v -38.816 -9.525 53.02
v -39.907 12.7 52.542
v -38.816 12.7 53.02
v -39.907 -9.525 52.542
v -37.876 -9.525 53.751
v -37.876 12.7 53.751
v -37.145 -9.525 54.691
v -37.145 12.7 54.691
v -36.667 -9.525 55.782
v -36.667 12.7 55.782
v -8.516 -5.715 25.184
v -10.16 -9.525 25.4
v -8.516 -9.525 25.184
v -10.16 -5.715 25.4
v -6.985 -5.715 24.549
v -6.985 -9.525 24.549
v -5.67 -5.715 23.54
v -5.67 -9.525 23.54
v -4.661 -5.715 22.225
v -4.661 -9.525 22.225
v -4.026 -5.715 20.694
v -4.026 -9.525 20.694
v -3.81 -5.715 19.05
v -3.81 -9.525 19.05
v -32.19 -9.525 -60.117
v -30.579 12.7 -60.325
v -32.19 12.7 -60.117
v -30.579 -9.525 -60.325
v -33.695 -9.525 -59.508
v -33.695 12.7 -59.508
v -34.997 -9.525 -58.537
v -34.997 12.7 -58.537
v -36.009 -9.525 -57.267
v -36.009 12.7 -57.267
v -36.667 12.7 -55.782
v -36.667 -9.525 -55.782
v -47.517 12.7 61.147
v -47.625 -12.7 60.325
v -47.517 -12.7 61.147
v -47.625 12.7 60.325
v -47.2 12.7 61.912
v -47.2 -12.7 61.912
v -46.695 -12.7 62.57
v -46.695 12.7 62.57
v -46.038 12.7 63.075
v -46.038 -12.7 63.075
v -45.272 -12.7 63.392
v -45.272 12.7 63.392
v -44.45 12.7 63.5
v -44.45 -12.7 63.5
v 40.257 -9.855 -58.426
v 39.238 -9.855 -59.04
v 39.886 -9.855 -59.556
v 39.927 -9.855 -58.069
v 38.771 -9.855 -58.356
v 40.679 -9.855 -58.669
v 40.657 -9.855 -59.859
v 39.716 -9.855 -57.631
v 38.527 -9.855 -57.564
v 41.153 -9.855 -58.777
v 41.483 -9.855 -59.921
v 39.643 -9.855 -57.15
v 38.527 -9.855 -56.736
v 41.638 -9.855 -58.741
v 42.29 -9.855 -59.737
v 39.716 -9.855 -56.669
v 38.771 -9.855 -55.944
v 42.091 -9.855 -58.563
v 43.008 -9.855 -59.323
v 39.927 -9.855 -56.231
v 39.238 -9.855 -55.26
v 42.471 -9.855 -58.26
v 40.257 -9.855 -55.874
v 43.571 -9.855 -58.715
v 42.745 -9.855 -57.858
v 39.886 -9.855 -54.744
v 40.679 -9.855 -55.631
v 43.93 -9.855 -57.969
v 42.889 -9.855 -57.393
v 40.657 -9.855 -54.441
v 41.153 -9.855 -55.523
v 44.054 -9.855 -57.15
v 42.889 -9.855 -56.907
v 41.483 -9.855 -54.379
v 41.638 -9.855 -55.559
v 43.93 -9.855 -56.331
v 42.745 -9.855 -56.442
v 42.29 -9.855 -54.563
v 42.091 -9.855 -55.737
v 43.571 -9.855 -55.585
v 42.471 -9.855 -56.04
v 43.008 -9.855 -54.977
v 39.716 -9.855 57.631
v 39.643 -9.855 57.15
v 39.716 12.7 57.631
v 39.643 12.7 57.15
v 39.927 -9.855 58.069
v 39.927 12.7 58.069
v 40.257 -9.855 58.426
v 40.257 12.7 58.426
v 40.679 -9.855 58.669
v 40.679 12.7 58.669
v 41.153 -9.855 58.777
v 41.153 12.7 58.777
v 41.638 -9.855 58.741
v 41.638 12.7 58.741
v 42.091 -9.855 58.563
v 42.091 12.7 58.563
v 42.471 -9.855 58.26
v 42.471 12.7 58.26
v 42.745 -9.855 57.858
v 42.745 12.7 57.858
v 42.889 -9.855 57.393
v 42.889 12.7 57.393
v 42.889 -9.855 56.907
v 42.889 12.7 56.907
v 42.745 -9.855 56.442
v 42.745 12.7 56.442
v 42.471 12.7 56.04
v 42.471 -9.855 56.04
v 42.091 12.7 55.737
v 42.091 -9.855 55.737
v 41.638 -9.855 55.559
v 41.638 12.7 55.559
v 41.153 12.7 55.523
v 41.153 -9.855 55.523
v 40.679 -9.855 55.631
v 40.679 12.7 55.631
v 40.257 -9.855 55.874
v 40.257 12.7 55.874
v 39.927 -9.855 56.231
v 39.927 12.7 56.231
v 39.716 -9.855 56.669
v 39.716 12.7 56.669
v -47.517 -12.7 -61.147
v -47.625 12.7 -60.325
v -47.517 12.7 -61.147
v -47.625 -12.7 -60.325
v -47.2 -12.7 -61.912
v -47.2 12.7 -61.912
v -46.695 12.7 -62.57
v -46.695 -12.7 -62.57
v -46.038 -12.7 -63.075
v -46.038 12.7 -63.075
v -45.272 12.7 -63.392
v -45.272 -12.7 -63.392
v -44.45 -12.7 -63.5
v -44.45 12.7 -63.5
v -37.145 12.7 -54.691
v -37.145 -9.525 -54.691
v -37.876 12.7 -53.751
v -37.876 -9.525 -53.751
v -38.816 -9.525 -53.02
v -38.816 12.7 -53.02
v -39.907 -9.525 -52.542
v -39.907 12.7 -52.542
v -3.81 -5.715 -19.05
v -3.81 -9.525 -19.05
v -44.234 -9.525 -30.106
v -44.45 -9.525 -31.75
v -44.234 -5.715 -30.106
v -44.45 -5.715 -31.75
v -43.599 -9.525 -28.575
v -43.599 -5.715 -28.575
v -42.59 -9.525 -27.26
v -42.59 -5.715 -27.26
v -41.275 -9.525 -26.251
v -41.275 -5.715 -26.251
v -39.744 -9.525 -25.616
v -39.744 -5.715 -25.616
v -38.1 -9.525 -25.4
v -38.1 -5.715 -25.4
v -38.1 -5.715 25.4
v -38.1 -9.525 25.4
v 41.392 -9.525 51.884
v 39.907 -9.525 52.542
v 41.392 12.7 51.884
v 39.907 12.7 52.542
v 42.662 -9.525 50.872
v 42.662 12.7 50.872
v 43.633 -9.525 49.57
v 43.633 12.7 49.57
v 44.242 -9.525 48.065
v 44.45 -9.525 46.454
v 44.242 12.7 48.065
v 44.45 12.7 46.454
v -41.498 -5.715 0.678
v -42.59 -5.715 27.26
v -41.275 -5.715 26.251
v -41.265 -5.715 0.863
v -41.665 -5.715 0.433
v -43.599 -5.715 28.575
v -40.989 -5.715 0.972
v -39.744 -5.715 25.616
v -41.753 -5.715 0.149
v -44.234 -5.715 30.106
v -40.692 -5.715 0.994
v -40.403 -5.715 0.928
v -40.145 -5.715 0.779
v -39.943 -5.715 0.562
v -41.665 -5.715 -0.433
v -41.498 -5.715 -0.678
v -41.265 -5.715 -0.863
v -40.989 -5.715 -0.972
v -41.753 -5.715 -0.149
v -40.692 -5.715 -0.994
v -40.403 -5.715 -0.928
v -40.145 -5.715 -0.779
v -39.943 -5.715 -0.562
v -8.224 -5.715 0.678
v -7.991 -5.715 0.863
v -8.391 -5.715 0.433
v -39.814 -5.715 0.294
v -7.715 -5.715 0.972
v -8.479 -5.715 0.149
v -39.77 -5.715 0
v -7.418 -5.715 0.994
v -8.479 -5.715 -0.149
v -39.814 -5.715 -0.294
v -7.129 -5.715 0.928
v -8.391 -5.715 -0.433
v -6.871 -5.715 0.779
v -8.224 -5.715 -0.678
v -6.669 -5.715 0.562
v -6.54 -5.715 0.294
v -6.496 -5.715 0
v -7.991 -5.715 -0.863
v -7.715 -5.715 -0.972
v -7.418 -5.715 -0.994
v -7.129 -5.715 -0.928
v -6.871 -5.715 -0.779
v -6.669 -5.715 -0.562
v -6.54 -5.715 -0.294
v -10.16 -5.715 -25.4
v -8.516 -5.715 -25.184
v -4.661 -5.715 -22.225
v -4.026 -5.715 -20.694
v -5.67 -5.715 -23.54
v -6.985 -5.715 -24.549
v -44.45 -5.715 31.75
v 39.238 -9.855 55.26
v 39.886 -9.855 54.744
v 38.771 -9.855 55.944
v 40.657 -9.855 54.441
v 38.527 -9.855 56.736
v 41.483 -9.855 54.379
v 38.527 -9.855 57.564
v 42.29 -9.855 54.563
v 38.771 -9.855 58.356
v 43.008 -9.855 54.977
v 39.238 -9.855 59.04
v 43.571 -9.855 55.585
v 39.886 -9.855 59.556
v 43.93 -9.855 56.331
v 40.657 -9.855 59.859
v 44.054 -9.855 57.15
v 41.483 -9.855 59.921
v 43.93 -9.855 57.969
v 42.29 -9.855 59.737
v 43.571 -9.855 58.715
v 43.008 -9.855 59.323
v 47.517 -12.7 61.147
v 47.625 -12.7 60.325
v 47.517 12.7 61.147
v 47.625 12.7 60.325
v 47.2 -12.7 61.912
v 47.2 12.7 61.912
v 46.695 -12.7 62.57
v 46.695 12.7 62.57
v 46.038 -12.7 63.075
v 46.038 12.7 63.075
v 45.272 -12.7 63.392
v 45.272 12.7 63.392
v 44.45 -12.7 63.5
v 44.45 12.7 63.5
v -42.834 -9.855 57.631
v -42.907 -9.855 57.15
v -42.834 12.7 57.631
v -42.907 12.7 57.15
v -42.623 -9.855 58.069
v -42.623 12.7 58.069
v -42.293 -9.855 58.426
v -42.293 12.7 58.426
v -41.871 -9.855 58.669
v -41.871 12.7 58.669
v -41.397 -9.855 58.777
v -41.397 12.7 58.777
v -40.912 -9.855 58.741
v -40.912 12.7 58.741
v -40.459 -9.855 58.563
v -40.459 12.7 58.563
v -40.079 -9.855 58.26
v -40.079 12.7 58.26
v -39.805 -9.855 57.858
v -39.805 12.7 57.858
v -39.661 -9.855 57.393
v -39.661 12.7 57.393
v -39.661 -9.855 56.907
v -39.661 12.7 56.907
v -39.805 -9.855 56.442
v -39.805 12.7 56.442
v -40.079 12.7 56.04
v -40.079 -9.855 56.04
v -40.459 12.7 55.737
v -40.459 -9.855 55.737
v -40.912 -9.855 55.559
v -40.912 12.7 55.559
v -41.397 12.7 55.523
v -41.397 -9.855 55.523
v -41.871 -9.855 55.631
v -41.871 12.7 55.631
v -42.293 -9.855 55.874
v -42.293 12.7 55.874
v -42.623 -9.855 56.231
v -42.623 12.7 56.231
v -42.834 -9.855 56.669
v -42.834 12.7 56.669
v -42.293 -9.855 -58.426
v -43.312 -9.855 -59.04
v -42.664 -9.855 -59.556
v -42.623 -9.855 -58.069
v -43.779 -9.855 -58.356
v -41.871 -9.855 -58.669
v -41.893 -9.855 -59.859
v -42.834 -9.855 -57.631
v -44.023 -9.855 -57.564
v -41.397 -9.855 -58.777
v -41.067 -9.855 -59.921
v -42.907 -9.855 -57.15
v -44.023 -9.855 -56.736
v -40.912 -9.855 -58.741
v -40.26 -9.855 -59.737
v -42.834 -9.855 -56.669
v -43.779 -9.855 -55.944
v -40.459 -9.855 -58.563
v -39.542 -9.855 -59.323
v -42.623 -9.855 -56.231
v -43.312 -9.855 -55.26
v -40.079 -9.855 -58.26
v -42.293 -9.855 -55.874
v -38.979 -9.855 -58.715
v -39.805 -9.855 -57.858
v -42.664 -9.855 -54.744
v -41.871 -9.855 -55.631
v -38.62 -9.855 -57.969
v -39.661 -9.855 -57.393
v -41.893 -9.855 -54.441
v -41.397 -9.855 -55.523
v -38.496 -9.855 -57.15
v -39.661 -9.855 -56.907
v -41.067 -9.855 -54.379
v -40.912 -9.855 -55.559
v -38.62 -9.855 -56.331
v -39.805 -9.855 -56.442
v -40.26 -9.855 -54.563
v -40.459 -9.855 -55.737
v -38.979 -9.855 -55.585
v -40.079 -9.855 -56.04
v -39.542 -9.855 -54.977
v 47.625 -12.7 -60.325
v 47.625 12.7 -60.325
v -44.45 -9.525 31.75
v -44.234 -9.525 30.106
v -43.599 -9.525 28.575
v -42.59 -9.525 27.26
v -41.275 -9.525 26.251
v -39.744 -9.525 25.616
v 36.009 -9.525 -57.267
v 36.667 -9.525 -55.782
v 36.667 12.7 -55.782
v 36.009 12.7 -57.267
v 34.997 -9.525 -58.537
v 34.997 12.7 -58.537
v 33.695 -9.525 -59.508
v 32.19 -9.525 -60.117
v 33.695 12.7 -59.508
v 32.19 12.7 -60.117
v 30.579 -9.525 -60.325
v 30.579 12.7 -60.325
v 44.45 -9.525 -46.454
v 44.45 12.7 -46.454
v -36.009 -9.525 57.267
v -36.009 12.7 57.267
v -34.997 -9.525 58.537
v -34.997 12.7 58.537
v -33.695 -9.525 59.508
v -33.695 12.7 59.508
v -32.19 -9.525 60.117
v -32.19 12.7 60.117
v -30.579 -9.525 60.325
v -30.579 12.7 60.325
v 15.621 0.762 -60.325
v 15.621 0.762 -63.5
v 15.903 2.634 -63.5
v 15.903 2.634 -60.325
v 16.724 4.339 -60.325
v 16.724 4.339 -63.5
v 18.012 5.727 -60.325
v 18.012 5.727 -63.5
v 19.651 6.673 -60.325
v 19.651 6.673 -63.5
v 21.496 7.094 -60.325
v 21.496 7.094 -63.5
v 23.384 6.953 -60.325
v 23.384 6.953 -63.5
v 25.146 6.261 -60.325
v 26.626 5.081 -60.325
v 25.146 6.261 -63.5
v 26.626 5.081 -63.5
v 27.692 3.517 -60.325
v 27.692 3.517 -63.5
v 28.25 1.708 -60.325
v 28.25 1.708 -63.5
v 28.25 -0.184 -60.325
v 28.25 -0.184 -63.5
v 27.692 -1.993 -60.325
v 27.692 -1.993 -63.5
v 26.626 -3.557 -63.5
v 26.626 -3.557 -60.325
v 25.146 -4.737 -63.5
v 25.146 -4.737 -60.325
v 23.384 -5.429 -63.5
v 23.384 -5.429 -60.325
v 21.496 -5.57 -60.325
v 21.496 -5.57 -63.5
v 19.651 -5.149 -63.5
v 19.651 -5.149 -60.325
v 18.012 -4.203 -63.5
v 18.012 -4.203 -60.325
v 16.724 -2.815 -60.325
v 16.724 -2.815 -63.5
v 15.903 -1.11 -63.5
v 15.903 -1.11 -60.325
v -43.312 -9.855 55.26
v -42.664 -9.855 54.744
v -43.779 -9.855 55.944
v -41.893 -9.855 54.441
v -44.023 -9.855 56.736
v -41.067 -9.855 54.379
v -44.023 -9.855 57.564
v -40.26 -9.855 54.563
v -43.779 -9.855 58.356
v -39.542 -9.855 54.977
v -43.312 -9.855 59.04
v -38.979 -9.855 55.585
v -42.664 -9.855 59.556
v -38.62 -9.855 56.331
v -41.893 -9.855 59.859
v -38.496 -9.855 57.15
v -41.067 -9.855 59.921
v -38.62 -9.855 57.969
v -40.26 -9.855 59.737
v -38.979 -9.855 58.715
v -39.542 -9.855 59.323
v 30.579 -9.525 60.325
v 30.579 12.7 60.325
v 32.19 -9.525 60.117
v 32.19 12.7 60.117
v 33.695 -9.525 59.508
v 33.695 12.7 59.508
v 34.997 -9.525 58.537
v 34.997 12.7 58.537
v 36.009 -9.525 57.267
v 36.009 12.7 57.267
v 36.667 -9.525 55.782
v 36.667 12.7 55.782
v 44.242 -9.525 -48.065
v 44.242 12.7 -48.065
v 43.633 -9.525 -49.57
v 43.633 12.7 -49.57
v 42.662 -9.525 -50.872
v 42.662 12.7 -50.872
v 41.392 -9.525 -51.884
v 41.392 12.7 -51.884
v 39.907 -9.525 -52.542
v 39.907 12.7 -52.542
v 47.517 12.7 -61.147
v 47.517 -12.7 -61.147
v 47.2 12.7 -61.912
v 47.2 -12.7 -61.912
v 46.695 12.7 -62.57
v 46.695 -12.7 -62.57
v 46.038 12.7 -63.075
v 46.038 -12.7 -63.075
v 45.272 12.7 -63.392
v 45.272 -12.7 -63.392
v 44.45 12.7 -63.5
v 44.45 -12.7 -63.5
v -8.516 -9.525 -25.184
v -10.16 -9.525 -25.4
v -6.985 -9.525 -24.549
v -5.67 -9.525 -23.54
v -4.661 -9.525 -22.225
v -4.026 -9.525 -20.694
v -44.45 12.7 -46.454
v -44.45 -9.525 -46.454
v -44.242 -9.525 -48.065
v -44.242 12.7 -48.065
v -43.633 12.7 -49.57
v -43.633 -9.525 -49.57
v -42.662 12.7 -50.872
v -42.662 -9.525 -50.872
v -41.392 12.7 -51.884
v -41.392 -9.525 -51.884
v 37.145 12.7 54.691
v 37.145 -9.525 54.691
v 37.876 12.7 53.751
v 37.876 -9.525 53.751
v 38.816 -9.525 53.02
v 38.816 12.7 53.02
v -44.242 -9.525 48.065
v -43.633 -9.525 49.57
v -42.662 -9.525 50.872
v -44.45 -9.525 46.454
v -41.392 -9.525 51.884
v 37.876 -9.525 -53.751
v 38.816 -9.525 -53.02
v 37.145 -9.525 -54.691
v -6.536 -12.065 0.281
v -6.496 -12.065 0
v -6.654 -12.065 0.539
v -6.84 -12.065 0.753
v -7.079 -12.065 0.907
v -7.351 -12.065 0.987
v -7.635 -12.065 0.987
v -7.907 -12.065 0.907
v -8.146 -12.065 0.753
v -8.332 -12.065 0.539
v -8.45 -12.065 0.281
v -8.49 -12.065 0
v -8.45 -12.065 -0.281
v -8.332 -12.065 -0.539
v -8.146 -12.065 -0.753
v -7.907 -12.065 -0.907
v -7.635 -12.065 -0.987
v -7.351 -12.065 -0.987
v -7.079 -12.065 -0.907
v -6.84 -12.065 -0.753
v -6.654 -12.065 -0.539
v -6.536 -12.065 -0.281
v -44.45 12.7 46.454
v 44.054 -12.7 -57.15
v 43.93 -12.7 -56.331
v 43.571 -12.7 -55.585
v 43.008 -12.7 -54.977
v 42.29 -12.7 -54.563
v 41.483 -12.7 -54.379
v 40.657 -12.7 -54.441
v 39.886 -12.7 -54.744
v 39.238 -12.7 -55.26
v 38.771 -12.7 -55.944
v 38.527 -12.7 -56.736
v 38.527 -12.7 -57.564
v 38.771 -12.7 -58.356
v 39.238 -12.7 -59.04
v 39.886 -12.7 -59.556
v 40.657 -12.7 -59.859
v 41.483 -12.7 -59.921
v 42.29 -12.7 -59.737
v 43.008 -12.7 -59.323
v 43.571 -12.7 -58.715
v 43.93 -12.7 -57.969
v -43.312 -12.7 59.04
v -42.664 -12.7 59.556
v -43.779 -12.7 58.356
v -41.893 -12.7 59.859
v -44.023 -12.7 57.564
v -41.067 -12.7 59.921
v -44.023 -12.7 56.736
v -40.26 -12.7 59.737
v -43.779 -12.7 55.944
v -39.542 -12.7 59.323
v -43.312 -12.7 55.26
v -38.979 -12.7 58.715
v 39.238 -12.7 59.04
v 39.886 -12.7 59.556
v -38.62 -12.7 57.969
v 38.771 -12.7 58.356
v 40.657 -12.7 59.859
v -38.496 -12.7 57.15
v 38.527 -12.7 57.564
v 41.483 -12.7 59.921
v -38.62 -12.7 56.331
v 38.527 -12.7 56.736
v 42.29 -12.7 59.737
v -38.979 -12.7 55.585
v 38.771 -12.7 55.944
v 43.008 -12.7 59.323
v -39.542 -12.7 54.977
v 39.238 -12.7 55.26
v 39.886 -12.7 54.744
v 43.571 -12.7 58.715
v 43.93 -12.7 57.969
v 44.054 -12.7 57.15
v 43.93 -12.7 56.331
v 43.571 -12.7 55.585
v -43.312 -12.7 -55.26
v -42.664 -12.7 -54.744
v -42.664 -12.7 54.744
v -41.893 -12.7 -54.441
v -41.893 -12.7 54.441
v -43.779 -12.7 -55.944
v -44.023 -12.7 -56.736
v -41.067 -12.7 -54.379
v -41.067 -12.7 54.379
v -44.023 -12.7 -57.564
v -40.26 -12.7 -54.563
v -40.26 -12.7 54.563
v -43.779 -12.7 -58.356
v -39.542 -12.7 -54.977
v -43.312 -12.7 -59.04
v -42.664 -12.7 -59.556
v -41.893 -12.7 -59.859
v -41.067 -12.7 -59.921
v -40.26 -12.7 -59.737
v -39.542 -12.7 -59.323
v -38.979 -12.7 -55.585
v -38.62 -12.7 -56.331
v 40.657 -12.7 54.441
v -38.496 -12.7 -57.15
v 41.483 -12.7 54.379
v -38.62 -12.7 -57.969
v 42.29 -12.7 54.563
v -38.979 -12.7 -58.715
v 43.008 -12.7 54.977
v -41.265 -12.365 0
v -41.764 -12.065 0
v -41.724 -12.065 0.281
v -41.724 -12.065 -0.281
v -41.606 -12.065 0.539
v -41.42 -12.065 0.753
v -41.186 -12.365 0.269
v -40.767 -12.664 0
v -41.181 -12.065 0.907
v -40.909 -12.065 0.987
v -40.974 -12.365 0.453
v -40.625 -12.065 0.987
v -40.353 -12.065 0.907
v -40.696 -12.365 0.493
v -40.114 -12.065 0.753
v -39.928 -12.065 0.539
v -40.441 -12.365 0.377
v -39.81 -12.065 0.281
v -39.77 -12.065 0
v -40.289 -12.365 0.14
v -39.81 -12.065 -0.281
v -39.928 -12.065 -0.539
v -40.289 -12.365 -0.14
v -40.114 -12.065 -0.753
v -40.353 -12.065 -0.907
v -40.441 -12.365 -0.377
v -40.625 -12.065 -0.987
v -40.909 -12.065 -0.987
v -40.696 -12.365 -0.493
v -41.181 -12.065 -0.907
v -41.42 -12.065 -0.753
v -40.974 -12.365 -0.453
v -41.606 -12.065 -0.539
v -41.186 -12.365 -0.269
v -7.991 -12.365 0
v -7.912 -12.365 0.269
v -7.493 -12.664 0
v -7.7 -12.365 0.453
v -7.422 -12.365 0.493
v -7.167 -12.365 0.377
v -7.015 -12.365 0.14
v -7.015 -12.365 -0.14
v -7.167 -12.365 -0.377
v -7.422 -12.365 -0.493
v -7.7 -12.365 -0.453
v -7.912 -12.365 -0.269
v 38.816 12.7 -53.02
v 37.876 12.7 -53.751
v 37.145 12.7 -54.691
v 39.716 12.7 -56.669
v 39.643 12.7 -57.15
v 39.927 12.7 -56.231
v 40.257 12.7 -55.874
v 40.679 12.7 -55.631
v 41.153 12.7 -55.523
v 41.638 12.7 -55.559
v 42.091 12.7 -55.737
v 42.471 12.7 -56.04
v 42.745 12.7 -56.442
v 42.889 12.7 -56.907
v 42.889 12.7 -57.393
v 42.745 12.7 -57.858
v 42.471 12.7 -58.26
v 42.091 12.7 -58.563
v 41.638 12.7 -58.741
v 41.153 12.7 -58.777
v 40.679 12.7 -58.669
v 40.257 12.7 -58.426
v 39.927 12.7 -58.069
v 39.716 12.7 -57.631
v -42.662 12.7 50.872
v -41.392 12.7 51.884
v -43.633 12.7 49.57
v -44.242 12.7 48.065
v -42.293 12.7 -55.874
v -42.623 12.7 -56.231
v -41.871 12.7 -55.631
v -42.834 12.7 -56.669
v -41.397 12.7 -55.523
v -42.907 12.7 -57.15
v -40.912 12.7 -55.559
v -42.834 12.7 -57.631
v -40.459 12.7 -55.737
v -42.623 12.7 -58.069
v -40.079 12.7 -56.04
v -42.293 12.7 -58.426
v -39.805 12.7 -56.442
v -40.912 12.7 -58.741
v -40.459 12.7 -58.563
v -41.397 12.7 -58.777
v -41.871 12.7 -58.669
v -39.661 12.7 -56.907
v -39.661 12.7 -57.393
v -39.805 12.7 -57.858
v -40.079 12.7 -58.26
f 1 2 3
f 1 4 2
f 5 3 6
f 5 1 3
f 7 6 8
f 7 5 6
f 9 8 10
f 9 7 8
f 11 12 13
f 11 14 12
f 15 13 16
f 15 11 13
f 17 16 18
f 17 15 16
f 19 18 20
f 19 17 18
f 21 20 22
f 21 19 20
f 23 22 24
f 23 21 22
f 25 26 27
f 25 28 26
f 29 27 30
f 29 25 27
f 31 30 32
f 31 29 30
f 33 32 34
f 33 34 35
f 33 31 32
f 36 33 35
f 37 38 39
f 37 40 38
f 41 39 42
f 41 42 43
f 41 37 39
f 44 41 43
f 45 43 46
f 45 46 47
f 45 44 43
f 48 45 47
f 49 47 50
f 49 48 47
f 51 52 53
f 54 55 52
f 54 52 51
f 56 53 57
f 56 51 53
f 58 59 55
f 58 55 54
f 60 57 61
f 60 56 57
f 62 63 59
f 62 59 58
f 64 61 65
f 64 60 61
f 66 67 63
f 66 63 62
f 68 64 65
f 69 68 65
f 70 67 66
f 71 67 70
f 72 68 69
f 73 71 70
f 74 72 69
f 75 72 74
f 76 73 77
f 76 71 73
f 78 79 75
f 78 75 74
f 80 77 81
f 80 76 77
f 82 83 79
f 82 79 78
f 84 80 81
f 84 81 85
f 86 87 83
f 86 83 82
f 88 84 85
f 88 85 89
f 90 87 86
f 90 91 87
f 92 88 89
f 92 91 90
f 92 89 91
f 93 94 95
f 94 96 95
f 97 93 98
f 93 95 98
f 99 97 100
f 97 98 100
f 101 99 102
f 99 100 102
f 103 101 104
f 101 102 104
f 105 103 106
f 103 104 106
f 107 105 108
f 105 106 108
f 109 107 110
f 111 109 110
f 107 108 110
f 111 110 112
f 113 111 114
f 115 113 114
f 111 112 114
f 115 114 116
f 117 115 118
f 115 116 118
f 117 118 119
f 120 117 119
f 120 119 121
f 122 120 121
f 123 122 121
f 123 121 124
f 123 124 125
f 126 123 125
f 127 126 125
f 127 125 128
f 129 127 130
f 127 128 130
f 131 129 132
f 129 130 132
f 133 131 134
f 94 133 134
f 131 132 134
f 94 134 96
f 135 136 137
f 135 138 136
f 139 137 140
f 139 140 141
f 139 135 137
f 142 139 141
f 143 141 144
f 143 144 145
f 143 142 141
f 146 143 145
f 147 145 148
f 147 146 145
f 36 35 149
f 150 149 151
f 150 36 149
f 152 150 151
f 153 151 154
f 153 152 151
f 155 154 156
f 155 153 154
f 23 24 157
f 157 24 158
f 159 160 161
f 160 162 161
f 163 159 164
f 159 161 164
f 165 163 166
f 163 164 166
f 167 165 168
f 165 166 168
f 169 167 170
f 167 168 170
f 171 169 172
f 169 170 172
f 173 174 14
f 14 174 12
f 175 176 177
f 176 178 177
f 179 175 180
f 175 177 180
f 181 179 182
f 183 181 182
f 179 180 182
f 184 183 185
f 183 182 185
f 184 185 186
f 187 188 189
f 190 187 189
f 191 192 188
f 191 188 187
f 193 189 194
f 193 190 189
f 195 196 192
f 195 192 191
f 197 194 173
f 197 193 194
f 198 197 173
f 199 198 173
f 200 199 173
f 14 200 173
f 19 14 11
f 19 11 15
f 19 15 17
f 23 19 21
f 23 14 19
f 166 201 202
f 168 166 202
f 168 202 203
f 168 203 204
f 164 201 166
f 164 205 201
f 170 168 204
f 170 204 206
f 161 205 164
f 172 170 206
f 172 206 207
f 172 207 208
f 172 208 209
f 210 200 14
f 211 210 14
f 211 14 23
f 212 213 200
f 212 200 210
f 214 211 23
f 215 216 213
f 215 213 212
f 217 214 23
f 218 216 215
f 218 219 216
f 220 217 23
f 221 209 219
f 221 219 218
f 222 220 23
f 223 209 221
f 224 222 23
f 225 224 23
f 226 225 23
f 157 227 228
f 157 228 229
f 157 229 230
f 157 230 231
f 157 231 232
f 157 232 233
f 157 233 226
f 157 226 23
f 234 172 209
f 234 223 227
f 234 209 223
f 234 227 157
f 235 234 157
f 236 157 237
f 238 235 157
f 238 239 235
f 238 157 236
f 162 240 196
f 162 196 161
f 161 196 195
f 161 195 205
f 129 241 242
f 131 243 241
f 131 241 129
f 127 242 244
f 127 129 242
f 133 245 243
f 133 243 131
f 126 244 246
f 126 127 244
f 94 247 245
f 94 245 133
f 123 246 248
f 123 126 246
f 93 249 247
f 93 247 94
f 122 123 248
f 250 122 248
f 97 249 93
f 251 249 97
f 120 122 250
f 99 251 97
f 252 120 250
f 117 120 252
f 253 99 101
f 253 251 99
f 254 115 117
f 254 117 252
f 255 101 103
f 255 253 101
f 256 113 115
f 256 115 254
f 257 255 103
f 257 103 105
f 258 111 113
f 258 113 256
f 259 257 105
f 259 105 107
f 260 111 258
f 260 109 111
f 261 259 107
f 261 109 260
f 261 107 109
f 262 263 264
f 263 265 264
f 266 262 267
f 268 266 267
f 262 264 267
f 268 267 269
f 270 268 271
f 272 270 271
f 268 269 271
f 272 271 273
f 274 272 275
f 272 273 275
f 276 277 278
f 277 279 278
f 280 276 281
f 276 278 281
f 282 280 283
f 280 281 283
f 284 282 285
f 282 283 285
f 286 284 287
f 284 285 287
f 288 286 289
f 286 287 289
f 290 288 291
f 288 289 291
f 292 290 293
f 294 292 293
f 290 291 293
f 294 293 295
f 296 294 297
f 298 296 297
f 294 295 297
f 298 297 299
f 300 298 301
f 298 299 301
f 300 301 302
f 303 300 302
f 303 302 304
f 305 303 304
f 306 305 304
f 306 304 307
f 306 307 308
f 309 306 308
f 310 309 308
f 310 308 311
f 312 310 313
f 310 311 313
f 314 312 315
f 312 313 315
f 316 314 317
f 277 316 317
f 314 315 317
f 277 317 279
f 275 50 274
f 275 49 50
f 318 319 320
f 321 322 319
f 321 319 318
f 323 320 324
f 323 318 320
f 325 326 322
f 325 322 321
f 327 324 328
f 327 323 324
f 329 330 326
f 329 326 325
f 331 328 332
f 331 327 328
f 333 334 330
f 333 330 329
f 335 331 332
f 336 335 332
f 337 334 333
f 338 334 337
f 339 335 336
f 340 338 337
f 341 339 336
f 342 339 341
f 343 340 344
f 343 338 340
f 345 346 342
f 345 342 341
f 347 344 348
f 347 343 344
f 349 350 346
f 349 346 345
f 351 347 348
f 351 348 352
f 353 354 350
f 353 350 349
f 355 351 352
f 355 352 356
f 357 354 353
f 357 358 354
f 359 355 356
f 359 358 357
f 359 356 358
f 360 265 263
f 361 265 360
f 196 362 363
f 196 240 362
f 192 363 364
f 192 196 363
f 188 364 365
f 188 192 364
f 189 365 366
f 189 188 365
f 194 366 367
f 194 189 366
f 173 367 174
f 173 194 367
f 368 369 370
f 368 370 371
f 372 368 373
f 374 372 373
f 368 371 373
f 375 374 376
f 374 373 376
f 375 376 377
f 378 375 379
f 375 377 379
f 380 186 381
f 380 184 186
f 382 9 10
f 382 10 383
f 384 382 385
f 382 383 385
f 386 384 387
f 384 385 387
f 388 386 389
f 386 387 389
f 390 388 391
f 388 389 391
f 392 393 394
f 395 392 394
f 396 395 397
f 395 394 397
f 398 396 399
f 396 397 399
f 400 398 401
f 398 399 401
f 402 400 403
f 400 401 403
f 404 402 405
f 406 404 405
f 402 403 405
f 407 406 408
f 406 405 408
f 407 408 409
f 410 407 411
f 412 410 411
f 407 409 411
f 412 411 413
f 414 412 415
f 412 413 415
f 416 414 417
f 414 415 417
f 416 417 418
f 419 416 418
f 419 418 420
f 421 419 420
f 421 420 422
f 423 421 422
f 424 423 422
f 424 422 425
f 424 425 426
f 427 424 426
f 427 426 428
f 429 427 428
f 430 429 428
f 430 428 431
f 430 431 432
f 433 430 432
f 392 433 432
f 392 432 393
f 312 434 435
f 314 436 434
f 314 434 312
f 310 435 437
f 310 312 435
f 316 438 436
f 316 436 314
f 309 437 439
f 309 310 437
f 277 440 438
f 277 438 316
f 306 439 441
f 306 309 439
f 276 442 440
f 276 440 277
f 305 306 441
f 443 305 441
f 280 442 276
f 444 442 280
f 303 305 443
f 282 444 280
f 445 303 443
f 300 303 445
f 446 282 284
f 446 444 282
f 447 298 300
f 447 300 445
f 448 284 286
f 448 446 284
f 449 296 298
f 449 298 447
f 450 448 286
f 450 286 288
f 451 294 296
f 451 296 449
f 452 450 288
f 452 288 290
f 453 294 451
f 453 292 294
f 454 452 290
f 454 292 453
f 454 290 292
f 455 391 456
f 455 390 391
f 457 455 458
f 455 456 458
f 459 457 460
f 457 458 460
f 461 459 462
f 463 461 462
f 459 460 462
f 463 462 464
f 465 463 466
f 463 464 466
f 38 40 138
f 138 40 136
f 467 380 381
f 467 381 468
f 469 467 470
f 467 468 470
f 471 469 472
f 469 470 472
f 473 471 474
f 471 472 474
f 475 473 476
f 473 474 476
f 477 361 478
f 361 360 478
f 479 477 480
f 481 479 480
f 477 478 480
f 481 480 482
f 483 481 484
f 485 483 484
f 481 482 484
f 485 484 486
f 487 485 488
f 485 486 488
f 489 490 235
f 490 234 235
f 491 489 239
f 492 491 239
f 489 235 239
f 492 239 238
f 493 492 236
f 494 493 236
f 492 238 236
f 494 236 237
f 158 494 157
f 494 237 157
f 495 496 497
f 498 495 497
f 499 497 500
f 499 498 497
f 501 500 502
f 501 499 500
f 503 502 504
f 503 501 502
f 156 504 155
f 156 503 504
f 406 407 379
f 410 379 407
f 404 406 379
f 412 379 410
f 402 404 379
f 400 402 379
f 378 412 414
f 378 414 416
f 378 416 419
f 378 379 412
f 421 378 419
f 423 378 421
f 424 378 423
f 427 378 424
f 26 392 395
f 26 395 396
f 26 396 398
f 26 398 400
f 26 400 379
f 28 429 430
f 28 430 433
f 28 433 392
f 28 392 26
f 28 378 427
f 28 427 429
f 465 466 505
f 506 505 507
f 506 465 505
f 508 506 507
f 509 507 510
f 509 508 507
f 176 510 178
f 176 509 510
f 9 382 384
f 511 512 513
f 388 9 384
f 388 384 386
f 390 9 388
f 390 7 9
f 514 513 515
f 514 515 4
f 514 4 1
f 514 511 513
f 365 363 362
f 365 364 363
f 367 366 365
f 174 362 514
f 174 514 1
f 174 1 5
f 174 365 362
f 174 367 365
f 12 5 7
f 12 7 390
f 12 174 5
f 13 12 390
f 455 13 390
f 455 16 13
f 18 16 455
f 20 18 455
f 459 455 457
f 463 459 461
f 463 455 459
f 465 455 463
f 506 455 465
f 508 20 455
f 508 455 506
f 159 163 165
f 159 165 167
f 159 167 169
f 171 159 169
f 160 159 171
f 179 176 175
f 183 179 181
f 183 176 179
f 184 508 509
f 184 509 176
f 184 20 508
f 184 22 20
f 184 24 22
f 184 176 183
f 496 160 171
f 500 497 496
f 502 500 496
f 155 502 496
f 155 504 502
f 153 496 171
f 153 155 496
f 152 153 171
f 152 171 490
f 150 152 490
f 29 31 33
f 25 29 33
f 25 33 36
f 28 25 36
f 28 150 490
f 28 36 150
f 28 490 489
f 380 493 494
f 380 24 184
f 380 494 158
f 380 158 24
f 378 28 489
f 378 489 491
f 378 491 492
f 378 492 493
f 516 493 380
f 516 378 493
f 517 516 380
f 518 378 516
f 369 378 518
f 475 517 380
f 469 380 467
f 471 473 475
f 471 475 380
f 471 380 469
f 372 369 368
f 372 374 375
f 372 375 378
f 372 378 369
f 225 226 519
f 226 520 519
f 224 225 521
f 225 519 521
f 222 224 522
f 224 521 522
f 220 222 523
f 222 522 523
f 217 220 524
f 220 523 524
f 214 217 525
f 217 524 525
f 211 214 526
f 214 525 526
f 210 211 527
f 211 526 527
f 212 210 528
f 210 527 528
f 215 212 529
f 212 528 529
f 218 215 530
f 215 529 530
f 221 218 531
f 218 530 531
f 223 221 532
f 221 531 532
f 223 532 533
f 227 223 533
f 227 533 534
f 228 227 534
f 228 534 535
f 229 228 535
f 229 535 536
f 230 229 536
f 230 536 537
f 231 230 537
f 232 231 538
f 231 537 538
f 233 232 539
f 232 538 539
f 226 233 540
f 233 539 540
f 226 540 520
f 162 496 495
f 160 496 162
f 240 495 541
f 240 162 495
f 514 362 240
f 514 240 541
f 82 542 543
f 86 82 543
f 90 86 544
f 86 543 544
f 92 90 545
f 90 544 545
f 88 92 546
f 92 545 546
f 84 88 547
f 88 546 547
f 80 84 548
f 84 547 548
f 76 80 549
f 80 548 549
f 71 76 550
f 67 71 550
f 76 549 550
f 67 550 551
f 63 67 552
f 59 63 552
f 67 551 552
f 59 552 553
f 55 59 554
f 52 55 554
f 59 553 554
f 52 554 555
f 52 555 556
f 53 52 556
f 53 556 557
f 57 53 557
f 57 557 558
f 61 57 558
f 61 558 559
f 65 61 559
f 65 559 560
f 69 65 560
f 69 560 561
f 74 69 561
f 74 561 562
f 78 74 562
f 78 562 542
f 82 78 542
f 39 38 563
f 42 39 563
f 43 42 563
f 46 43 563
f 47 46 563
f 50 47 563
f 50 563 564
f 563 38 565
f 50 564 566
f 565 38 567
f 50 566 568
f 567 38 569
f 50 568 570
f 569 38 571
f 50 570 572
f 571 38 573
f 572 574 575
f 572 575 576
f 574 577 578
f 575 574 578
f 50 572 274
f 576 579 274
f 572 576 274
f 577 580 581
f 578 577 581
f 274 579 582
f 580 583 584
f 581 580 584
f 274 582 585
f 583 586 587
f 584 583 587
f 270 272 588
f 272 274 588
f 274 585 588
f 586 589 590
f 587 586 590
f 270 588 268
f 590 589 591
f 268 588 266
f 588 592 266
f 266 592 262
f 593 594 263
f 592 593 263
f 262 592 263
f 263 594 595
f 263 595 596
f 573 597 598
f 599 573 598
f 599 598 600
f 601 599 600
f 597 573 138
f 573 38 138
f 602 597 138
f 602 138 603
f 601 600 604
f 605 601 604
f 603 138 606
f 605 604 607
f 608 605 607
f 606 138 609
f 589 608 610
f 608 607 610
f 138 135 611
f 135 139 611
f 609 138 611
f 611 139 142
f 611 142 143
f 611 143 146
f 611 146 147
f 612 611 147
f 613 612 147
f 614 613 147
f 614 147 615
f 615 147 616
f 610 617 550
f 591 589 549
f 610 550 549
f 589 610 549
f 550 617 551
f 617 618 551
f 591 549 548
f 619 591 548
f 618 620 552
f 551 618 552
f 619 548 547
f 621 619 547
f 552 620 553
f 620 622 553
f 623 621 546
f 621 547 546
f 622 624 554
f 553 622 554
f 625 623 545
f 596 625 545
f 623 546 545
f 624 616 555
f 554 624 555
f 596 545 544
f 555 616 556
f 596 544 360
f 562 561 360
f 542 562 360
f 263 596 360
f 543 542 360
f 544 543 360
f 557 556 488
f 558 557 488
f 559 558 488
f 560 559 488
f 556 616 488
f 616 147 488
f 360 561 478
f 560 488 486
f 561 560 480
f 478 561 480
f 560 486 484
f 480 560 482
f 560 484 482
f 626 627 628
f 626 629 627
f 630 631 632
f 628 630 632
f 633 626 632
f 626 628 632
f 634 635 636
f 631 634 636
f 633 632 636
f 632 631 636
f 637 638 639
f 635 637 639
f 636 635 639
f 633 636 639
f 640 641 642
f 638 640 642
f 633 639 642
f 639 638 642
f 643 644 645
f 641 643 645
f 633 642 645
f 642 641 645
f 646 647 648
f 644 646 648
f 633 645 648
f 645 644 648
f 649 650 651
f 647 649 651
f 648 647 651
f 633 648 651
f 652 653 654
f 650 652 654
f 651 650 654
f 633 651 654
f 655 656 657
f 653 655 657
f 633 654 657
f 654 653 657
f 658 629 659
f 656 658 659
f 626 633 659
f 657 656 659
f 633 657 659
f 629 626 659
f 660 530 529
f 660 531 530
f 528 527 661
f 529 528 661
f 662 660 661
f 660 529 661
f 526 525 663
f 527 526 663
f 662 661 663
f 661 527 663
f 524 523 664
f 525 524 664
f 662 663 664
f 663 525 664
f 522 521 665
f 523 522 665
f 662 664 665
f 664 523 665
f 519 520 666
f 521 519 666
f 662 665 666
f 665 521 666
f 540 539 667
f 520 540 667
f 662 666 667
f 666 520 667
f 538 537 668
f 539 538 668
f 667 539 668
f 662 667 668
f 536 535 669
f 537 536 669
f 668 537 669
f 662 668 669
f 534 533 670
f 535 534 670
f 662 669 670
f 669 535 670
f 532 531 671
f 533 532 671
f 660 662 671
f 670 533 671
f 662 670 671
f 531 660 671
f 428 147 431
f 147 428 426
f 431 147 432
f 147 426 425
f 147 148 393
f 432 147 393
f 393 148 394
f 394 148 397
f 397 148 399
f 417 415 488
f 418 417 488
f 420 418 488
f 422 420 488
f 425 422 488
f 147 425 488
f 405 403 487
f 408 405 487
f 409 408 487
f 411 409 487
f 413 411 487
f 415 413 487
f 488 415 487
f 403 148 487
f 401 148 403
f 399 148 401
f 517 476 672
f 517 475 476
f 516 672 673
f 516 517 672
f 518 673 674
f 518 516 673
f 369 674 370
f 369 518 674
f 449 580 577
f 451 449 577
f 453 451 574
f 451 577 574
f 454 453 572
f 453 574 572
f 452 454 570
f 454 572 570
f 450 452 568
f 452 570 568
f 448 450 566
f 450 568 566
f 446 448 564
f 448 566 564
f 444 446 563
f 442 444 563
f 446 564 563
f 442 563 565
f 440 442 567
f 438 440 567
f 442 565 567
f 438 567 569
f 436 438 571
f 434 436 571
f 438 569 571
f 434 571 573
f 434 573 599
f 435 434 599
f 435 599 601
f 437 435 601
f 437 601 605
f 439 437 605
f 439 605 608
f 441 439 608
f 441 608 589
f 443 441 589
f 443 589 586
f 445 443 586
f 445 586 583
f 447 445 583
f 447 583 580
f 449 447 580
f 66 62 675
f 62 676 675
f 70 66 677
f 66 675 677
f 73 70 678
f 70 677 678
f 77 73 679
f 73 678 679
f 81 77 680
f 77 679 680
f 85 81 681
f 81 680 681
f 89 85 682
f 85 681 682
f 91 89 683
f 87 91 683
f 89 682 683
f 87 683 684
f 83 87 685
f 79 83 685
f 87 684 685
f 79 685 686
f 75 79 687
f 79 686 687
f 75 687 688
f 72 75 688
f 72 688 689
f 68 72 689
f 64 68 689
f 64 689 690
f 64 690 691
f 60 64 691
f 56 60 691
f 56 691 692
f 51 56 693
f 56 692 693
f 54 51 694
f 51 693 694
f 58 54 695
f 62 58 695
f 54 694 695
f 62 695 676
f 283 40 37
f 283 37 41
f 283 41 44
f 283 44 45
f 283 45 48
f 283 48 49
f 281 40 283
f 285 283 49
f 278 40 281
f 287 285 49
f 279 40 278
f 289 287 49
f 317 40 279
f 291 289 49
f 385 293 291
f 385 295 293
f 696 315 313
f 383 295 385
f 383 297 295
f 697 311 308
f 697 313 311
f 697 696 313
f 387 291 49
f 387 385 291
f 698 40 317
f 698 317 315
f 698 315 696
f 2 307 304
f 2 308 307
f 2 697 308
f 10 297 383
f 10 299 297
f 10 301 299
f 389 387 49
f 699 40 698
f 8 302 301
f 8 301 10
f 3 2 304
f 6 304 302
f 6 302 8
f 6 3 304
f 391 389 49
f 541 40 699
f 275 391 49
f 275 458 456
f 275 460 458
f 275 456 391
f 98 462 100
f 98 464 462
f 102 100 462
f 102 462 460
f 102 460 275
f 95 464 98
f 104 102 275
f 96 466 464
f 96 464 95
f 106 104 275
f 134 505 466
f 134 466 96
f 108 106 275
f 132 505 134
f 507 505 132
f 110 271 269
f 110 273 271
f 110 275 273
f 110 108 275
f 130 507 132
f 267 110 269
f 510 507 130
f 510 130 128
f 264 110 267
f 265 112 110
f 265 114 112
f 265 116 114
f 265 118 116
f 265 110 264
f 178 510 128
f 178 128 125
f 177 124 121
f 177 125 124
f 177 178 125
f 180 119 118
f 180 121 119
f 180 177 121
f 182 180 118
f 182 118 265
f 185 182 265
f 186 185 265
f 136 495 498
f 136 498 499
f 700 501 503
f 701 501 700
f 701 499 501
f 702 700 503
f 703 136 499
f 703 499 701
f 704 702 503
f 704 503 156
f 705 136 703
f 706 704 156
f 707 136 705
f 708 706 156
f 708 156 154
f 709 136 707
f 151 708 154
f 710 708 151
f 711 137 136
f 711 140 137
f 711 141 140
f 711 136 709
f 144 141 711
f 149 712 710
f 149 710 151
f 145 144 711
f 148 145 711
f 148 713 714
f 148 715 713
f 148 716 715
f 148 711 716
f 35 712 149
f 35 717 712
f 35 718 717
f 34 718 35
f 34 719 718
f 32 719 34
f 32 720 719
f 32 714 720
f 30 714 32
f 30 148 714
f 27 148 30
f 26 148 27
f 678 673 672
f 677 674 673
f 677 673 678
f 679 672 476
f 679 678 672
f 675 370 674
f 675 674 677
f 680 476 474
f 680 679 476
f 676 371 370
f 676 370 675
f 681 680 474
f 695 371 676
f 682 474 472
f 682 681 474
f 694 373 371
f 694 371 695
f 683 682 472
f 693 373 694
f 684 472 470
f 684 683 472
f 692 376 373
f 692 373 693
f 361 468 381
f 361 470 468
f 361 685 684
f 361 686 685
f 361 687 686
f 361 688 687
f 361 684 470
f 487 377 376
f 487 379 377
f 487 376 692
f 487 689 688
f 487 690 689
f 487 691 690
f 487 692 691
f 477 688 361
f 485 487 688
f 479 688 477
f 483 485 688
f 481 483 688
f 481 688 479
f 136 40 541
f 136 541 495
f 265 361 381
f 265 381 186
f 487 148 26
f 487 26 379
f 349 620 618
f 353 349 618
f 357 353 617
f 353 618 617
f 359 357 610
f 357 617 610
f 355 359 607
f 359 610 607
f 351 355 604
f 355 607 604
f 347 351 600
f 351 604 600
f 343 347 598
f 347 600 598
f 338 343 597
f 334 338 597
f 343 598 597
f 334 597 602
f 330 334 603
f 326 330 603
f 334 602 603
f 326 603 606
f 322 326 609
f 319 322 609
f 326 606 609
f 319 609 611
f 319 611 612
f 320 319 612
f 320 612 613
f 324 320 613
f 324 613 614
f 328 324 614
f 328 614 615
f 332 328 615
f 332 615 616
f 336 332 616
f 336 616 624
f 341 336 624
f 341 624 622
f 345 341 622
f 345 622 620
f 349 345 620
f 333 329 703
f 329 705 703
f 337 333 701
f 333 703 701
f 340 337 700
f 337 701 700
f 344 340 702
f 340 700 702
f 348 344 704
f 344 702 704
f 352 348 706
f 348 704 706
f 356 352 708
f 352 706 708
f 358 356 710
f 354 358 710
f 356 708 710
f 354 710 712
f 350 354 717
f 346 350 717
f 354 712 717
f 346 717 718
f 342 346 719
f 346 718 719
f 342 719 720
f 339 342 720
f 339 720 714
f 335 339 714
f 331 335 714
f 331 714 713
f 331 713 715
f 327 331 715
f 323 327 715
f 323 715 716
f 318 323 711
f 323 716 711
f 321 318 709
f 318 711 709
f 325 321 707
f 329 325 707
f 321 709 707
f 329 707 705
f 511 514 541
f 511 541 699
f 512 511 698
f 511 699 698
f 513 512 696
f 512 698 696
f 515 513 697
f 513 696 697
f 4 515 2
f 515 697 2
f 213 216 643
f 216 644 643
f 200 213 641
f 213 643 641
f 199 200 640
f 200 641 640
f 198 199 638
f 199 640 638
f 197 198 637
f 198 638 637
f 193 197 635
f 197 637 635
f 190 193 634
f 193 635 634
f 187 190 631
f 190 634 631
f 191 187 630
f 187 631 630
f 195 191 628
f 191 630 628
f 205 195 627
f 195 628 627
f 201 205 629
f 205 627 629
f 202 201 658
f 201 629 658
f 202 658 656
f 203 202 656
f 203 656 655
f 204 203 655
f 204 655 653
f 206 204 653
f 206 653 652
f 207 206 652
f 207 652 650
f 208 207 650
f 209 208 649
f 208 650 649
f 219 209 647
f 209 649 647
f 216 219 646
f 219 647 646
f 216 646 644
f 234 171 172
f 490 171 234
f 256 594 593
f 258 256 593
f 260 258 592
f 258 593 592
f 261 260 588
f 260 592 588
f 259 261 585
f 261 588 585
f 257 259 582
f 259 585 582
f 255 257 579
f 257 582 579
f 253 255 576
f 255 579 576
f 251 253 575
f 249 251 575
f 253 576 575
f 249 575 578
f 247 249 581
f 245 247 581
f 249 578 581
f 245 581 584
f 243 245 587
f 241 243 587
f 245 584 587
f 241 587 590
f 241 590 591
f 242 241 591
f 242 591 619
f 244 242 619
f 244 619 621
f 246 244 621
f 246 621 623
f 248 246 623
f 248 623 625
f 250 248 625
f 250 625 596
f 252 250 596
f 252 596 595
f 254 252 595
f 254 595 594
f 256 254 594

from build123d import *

# Parameters (mm, degrees)
SKETCH1_W                                      = 95.25
SKETCH1_H                                      = 127
BOSS_EXTRUDE1_DEPTH                            = 12.7
FILLET1_R                                      = 3.175
CBORE_FOR_4_SOCKET_HEAD_CAP_SCREW1_D           = 3.2639
CBORE_FOR_4_SOCKET_HEAD_CAP_SCREW1_CBORE_D     = 5.55752
CBORE_FOR_4_SOCKET_HEAD_CAP_SCREW1_CBORE_DEPTH = 2.8448
SHELL1_START                                   = -9.525
SHELL1_DEPTH                                   = 22.225
SHELL1_START_2                                 = -6.6802
SHELL1_2_DEPTH                                 = 19.3802
CUT_EXTRUDE1_START                             = -2.8448
CUT_EXTRUDE1_DEPTH                             = 2.8448
SKETCH7_W                                      = 40.64
SKETCH7_H                                      = 50.8
BOSS_EXTRUDE2_DEPTH                            = 3.81
F_3_48_TAPPED_HOLE1_D                          = 1.9939
F_3_48_TAPPED_HOLE1_DEPTH                      = 6.35
F_3_48_TAPPED_HOLE1_TIP                        = 0.599027994
FILLET4_R                                      = 6.35
FILLET5_R                                      = 6.35
SKETCH12_R                                     = 6.35
CUT_EXTRUDE2_DEPTH                             = 6.35


# Read off the part's stored shape, not the designer's step: Shell1
with BuildPart() as part:
    # Sketch1 → Boss-Extrude1 (new, symmetric)
    with BuildSketch(Plane(origin=(0, 0, 0), x_dir=(1, 0, 0), z_dir=(0, 1, 0))):
        Rectangle(SKETCH1_W, SKETCH1_H)
    extrude(amount=BOSS_EXTRUDE1_DEPTH, both=True)

    # Fillet1
    fillet1_edges = [part.edges().sort_by_distance(p)[0] for p in [
        (47.625, 0, 63.5),
        (-47.625, 0, 63.5),
        (-47.625, 0, -63.5),
        (47.625, 0, -63.5),
    ]]
    fillet(fillet1_edges, radius=FILLET1_R)

    # CBORE for #4 Socket Head Cap Screw1 (through all)
    with Locations(Plane.XZ.offset(12.7)):
        with Locations((-41.275, -57.15), (-41.275, 57.15), (41.275, 57.15), (41.275, -57.15)):
            CounterBoreHole(CBORE_FOR_4_SOCKET_HEAD_CAP_SCREW1_D / 2, CBORE_FOR_4_SOCKET_HEAD_CAP_SCREW1_CBORE_D / 2, CBORE_FOR_4_SOCKET_HEAD_CAP_SCREW1_CBORE_DEPTH)

    # Shell1 outline → Shell1 (cut)
    with BuildSketch(Plane(origin=(0, 0, 0), x_dir=(1, 0, 0), z_dir=(0, 1, 0)).offset(SHELL1_START)):
        with BuildLine():
            Line((36.238470129, 60.325), (-36.238470129, 60.325))
            ThreePointArc((-36.238470129, 60.325), (-37.06505593, 52.94005593), (-44.45, 52.113470129))
            Line((-44.45, 52.113470129), (-44.45, -52.113470129))
            ThreePointArc((-44.45, -52.113470129), (-37.06505593, -52.94005593), (-36.238470129, -60.325))
            Line((-36.238470129, -60.325), (36.238470129, -60.325))
            ThreePointArc((36.238470129, -60.325), (37.06505593, -52.94005593), (44.45, -52.113470129))
            Line((44.45, -52.113470129), (44.45, 52.113470129))
            ThreePointArc((44.45, 52.113470129), (37.06505593, 52.94005593), (36.238470129, 60.325))
        make_face()
    extrude(amount=SHELL1_DEPTH, mode=Mode.SUBTRACT)

    # Shell1 2 outline → Shell1 2 (cut)
    with BuildSketch(Plane(origin=(0, 0, 0), x_dir=(1, 0, 0), z_dir=(0, 1, 0)).offset(SHELL1_START_2)):
        with BuildLine():
            Line((-36.238470129, 60.325), (-37.665825122, 60.325))
            ThreePointArc((-37.665825122, 60.325), (-37.875973058, 53.750973058), (-44.45, 53.540825122))
            Line((-44.45, 53.540825122), (-44.45, 52.113470129))
            ThreePointArc((-44.45, 52.113470129), (-37.06505593, 52.94005593), (-36.238470129, 60.325))
        make_face()
        with BuildLine():
            Line((37.665825122, 60.325), (36.238470129, 60.325))
            ThreePointArc((36.238470129, 60.325), (37.06505593, 52.94005593), (44.45, 52.113470129))
            Line((44.45, 52.113470129), (44.45, 53.540825122))
            ThreePointArc((44.45, 53.540825122), (37.875973058, 53.750973058), (37.665825122, 60.325))
        make_face()
        with BuildLine():
            ThreePointArc((-36.238470129, -60.325), (-37.06505593, -52.94005593), (-44.45, -52.113470129))
            Line((-44.45, -52.113470129), (-44.45, -53.540825122))
            ThreePointArc((-44.45, -53.540825122), (-37.875973058, -53.750973058), (-37.665825122, -60.325))
            Line((-37.665825122, -60.325), (-36.238470129, -60.325))
        make_face()
        with BuildLine():
            Line((44.45, -53.540825122), (44.45, -52.113470129))
            ThreePointArc((44.45, -52.113470129), (37.06505593, -52.94005593), (36.238470129, -60.325))
            Line((36.238470129, -60.325), (37.665825122, -60.325))
            ThreePointArc((37.665825122, -60.325), (37.875973058, -53.750973058), (44.45, -53.540825122))
        make_face()
    extrude(amount=SHELL1_2_DEPTH, mode=Mode.SUBTRACT)

    # Sketch11 → Cut-Extrude1 (cut)
    with BuildSketch(Plane(origin=(0, -6.6802, 0), x_dir=(1, 0, 0), z_dir=(0, 1, 0)).offset(CUT_EXTRUDE1_START)):
        with BuildLine():
            Line((-44.45, 53.540825122), (-44.45, 52.113470129))
            ThreePointArc((-44.45, 52.113470129), (-37.06505593, 52.94005593), (-36.238470129, 60.325))
            Line((-36.238470129, 60.325), (-37.665825122, 60.325))
            ThreePointArc((-37.665825122, 60.325), (-37.875973058, 53.750973058), (-44.45, 53.540825122))
        make_face()
        with BuildLine():
            Line((44.45, 52.113470129), (44.45, 53.540825122))
            ThreePointArc((44.45, 53.540825122), (37.875973058, 53.750973058), (37.665825122, 60.325))
            Line((37.665825122, 60.325), (36.238470129, 60.325))
            ThreePointArc((36.238470129, 60.325), (37.06505593, 52.94005593), (44.45, 52.113470129))
        make_face()
        with BuildLine():
            Line((-44.45, -52.113470129), (-44.45, -53.540825122))
            ThreePointArc((-44.45, -53.540825122), (-37.875973058, -53.750973058), (-37.665825122, -60.325))
            Line((-37.665825122, -60.325), (-36.238470129, -60.325))
            ThreePointArc((-36.238470129, -60.325), (-37.06505593, -52.94005593), (-44.45, -52.113470129))
        make_face()
        with BuildLine():
            Line((36.238470129, -60.325), (37.665825122, -60.325))
            ThreePointArc((37.665825122, -60.325), (37.875973058, -53.750973058), (44.45, -53.540825122))
            Line((44.45, -53.540825122), (44.45, -52.113470129))
            ThreePointArc((44.45, -52.113470129), (37.06505593, -52.94005593), (36.238470129, -60.325))
        make_face()
    extrude(amount=CUT_EXTRUDE1_DEPTH, mode=Mode.SUBTRACT)

    # Sketch7 → Boss-Extrude2 (add)
    with BuildSketch(Plane(origin=(0, -9.525, 0), x_dir=(1, 0, 0), z_dir=(0, 1, 0))):
        with Locations((-24.13, 0)):
            Rectangle(SKETCH7_W, SKETCH7_H)
    extrude(amount=BOSS_EXTRUDE2_DEPTH)

    # #3-48 Tapped Hole1
    with Locations(Plane(origin=(0, -5.715, 0), x_dir=(-1, 0, 0), z_dir=(0, 1, 0))):
        with Locations((40.767, 0), (7.493, 0)):
            Hole(F_3_48_TAPPED_HOLE1_D / 2, depth=F_3_48_TAPPED_HOLE1_DEPTH)
            with Locations((0, 0, -(F_3_48_TAPPED_HOLE1_DEPTH + F_3_48_TAPPED_HOLE1_TIP / 2))):  # 118° drill point
                Cone(0, F_3_48_TAPPED_HOLE1_D / 2, F_3_48_TAPPED_HOLE1_TIP, mode=Mode.SUBTRACT)

    # Fillet4
    fillet4_edges = [part.edges().sort_by_distance(p)[0] for p in [
        (-3.81, -7.62, 25.4),
        (-3.81, -7.62, -25.4),
        (-44.45, -7.62, -25.4),
        (-44.45, -7.62, 25.4),
    ]]
    fillet(fillet4_edges, radius=FILLET4_R)

    # Fillet5
    fillet5_edges = [part.edges().sort_by_distance(p)[0] for p in [
        (37.665825122, 3.0099, -60.325),
        (44.45, 3.0099, 53.540825122),
        (-44.45, 3.0099, -53.540825122),
        (-37.665825122, 3.0099, 60.325),
        (44.45, 3.0099, -53.540825122),
        (37.665825122, 3.0099, 60.325),
        (-44.45, 3.0099, 53.540825122),
        (-37.665825122, 3.0099, -60.325),
    ]]
    fillet(fillet5_edges, radius=FILLET5_R)

    # Sketch12 → Cut-Extrude2 (cut)
    with BuildSketch(Plane(origin=(0, 0, -63.5), x_dir=(-1, 0, 0), z_dir=(0, 0, -1))):
        with Locations((-21.971, 0.762)):
            Circle(SKETCH12_R)
    extrude(amount=-CUT_EXTRUDE2_DEPTH, mode=Mode.SUBTRACT)


solid = part.part
